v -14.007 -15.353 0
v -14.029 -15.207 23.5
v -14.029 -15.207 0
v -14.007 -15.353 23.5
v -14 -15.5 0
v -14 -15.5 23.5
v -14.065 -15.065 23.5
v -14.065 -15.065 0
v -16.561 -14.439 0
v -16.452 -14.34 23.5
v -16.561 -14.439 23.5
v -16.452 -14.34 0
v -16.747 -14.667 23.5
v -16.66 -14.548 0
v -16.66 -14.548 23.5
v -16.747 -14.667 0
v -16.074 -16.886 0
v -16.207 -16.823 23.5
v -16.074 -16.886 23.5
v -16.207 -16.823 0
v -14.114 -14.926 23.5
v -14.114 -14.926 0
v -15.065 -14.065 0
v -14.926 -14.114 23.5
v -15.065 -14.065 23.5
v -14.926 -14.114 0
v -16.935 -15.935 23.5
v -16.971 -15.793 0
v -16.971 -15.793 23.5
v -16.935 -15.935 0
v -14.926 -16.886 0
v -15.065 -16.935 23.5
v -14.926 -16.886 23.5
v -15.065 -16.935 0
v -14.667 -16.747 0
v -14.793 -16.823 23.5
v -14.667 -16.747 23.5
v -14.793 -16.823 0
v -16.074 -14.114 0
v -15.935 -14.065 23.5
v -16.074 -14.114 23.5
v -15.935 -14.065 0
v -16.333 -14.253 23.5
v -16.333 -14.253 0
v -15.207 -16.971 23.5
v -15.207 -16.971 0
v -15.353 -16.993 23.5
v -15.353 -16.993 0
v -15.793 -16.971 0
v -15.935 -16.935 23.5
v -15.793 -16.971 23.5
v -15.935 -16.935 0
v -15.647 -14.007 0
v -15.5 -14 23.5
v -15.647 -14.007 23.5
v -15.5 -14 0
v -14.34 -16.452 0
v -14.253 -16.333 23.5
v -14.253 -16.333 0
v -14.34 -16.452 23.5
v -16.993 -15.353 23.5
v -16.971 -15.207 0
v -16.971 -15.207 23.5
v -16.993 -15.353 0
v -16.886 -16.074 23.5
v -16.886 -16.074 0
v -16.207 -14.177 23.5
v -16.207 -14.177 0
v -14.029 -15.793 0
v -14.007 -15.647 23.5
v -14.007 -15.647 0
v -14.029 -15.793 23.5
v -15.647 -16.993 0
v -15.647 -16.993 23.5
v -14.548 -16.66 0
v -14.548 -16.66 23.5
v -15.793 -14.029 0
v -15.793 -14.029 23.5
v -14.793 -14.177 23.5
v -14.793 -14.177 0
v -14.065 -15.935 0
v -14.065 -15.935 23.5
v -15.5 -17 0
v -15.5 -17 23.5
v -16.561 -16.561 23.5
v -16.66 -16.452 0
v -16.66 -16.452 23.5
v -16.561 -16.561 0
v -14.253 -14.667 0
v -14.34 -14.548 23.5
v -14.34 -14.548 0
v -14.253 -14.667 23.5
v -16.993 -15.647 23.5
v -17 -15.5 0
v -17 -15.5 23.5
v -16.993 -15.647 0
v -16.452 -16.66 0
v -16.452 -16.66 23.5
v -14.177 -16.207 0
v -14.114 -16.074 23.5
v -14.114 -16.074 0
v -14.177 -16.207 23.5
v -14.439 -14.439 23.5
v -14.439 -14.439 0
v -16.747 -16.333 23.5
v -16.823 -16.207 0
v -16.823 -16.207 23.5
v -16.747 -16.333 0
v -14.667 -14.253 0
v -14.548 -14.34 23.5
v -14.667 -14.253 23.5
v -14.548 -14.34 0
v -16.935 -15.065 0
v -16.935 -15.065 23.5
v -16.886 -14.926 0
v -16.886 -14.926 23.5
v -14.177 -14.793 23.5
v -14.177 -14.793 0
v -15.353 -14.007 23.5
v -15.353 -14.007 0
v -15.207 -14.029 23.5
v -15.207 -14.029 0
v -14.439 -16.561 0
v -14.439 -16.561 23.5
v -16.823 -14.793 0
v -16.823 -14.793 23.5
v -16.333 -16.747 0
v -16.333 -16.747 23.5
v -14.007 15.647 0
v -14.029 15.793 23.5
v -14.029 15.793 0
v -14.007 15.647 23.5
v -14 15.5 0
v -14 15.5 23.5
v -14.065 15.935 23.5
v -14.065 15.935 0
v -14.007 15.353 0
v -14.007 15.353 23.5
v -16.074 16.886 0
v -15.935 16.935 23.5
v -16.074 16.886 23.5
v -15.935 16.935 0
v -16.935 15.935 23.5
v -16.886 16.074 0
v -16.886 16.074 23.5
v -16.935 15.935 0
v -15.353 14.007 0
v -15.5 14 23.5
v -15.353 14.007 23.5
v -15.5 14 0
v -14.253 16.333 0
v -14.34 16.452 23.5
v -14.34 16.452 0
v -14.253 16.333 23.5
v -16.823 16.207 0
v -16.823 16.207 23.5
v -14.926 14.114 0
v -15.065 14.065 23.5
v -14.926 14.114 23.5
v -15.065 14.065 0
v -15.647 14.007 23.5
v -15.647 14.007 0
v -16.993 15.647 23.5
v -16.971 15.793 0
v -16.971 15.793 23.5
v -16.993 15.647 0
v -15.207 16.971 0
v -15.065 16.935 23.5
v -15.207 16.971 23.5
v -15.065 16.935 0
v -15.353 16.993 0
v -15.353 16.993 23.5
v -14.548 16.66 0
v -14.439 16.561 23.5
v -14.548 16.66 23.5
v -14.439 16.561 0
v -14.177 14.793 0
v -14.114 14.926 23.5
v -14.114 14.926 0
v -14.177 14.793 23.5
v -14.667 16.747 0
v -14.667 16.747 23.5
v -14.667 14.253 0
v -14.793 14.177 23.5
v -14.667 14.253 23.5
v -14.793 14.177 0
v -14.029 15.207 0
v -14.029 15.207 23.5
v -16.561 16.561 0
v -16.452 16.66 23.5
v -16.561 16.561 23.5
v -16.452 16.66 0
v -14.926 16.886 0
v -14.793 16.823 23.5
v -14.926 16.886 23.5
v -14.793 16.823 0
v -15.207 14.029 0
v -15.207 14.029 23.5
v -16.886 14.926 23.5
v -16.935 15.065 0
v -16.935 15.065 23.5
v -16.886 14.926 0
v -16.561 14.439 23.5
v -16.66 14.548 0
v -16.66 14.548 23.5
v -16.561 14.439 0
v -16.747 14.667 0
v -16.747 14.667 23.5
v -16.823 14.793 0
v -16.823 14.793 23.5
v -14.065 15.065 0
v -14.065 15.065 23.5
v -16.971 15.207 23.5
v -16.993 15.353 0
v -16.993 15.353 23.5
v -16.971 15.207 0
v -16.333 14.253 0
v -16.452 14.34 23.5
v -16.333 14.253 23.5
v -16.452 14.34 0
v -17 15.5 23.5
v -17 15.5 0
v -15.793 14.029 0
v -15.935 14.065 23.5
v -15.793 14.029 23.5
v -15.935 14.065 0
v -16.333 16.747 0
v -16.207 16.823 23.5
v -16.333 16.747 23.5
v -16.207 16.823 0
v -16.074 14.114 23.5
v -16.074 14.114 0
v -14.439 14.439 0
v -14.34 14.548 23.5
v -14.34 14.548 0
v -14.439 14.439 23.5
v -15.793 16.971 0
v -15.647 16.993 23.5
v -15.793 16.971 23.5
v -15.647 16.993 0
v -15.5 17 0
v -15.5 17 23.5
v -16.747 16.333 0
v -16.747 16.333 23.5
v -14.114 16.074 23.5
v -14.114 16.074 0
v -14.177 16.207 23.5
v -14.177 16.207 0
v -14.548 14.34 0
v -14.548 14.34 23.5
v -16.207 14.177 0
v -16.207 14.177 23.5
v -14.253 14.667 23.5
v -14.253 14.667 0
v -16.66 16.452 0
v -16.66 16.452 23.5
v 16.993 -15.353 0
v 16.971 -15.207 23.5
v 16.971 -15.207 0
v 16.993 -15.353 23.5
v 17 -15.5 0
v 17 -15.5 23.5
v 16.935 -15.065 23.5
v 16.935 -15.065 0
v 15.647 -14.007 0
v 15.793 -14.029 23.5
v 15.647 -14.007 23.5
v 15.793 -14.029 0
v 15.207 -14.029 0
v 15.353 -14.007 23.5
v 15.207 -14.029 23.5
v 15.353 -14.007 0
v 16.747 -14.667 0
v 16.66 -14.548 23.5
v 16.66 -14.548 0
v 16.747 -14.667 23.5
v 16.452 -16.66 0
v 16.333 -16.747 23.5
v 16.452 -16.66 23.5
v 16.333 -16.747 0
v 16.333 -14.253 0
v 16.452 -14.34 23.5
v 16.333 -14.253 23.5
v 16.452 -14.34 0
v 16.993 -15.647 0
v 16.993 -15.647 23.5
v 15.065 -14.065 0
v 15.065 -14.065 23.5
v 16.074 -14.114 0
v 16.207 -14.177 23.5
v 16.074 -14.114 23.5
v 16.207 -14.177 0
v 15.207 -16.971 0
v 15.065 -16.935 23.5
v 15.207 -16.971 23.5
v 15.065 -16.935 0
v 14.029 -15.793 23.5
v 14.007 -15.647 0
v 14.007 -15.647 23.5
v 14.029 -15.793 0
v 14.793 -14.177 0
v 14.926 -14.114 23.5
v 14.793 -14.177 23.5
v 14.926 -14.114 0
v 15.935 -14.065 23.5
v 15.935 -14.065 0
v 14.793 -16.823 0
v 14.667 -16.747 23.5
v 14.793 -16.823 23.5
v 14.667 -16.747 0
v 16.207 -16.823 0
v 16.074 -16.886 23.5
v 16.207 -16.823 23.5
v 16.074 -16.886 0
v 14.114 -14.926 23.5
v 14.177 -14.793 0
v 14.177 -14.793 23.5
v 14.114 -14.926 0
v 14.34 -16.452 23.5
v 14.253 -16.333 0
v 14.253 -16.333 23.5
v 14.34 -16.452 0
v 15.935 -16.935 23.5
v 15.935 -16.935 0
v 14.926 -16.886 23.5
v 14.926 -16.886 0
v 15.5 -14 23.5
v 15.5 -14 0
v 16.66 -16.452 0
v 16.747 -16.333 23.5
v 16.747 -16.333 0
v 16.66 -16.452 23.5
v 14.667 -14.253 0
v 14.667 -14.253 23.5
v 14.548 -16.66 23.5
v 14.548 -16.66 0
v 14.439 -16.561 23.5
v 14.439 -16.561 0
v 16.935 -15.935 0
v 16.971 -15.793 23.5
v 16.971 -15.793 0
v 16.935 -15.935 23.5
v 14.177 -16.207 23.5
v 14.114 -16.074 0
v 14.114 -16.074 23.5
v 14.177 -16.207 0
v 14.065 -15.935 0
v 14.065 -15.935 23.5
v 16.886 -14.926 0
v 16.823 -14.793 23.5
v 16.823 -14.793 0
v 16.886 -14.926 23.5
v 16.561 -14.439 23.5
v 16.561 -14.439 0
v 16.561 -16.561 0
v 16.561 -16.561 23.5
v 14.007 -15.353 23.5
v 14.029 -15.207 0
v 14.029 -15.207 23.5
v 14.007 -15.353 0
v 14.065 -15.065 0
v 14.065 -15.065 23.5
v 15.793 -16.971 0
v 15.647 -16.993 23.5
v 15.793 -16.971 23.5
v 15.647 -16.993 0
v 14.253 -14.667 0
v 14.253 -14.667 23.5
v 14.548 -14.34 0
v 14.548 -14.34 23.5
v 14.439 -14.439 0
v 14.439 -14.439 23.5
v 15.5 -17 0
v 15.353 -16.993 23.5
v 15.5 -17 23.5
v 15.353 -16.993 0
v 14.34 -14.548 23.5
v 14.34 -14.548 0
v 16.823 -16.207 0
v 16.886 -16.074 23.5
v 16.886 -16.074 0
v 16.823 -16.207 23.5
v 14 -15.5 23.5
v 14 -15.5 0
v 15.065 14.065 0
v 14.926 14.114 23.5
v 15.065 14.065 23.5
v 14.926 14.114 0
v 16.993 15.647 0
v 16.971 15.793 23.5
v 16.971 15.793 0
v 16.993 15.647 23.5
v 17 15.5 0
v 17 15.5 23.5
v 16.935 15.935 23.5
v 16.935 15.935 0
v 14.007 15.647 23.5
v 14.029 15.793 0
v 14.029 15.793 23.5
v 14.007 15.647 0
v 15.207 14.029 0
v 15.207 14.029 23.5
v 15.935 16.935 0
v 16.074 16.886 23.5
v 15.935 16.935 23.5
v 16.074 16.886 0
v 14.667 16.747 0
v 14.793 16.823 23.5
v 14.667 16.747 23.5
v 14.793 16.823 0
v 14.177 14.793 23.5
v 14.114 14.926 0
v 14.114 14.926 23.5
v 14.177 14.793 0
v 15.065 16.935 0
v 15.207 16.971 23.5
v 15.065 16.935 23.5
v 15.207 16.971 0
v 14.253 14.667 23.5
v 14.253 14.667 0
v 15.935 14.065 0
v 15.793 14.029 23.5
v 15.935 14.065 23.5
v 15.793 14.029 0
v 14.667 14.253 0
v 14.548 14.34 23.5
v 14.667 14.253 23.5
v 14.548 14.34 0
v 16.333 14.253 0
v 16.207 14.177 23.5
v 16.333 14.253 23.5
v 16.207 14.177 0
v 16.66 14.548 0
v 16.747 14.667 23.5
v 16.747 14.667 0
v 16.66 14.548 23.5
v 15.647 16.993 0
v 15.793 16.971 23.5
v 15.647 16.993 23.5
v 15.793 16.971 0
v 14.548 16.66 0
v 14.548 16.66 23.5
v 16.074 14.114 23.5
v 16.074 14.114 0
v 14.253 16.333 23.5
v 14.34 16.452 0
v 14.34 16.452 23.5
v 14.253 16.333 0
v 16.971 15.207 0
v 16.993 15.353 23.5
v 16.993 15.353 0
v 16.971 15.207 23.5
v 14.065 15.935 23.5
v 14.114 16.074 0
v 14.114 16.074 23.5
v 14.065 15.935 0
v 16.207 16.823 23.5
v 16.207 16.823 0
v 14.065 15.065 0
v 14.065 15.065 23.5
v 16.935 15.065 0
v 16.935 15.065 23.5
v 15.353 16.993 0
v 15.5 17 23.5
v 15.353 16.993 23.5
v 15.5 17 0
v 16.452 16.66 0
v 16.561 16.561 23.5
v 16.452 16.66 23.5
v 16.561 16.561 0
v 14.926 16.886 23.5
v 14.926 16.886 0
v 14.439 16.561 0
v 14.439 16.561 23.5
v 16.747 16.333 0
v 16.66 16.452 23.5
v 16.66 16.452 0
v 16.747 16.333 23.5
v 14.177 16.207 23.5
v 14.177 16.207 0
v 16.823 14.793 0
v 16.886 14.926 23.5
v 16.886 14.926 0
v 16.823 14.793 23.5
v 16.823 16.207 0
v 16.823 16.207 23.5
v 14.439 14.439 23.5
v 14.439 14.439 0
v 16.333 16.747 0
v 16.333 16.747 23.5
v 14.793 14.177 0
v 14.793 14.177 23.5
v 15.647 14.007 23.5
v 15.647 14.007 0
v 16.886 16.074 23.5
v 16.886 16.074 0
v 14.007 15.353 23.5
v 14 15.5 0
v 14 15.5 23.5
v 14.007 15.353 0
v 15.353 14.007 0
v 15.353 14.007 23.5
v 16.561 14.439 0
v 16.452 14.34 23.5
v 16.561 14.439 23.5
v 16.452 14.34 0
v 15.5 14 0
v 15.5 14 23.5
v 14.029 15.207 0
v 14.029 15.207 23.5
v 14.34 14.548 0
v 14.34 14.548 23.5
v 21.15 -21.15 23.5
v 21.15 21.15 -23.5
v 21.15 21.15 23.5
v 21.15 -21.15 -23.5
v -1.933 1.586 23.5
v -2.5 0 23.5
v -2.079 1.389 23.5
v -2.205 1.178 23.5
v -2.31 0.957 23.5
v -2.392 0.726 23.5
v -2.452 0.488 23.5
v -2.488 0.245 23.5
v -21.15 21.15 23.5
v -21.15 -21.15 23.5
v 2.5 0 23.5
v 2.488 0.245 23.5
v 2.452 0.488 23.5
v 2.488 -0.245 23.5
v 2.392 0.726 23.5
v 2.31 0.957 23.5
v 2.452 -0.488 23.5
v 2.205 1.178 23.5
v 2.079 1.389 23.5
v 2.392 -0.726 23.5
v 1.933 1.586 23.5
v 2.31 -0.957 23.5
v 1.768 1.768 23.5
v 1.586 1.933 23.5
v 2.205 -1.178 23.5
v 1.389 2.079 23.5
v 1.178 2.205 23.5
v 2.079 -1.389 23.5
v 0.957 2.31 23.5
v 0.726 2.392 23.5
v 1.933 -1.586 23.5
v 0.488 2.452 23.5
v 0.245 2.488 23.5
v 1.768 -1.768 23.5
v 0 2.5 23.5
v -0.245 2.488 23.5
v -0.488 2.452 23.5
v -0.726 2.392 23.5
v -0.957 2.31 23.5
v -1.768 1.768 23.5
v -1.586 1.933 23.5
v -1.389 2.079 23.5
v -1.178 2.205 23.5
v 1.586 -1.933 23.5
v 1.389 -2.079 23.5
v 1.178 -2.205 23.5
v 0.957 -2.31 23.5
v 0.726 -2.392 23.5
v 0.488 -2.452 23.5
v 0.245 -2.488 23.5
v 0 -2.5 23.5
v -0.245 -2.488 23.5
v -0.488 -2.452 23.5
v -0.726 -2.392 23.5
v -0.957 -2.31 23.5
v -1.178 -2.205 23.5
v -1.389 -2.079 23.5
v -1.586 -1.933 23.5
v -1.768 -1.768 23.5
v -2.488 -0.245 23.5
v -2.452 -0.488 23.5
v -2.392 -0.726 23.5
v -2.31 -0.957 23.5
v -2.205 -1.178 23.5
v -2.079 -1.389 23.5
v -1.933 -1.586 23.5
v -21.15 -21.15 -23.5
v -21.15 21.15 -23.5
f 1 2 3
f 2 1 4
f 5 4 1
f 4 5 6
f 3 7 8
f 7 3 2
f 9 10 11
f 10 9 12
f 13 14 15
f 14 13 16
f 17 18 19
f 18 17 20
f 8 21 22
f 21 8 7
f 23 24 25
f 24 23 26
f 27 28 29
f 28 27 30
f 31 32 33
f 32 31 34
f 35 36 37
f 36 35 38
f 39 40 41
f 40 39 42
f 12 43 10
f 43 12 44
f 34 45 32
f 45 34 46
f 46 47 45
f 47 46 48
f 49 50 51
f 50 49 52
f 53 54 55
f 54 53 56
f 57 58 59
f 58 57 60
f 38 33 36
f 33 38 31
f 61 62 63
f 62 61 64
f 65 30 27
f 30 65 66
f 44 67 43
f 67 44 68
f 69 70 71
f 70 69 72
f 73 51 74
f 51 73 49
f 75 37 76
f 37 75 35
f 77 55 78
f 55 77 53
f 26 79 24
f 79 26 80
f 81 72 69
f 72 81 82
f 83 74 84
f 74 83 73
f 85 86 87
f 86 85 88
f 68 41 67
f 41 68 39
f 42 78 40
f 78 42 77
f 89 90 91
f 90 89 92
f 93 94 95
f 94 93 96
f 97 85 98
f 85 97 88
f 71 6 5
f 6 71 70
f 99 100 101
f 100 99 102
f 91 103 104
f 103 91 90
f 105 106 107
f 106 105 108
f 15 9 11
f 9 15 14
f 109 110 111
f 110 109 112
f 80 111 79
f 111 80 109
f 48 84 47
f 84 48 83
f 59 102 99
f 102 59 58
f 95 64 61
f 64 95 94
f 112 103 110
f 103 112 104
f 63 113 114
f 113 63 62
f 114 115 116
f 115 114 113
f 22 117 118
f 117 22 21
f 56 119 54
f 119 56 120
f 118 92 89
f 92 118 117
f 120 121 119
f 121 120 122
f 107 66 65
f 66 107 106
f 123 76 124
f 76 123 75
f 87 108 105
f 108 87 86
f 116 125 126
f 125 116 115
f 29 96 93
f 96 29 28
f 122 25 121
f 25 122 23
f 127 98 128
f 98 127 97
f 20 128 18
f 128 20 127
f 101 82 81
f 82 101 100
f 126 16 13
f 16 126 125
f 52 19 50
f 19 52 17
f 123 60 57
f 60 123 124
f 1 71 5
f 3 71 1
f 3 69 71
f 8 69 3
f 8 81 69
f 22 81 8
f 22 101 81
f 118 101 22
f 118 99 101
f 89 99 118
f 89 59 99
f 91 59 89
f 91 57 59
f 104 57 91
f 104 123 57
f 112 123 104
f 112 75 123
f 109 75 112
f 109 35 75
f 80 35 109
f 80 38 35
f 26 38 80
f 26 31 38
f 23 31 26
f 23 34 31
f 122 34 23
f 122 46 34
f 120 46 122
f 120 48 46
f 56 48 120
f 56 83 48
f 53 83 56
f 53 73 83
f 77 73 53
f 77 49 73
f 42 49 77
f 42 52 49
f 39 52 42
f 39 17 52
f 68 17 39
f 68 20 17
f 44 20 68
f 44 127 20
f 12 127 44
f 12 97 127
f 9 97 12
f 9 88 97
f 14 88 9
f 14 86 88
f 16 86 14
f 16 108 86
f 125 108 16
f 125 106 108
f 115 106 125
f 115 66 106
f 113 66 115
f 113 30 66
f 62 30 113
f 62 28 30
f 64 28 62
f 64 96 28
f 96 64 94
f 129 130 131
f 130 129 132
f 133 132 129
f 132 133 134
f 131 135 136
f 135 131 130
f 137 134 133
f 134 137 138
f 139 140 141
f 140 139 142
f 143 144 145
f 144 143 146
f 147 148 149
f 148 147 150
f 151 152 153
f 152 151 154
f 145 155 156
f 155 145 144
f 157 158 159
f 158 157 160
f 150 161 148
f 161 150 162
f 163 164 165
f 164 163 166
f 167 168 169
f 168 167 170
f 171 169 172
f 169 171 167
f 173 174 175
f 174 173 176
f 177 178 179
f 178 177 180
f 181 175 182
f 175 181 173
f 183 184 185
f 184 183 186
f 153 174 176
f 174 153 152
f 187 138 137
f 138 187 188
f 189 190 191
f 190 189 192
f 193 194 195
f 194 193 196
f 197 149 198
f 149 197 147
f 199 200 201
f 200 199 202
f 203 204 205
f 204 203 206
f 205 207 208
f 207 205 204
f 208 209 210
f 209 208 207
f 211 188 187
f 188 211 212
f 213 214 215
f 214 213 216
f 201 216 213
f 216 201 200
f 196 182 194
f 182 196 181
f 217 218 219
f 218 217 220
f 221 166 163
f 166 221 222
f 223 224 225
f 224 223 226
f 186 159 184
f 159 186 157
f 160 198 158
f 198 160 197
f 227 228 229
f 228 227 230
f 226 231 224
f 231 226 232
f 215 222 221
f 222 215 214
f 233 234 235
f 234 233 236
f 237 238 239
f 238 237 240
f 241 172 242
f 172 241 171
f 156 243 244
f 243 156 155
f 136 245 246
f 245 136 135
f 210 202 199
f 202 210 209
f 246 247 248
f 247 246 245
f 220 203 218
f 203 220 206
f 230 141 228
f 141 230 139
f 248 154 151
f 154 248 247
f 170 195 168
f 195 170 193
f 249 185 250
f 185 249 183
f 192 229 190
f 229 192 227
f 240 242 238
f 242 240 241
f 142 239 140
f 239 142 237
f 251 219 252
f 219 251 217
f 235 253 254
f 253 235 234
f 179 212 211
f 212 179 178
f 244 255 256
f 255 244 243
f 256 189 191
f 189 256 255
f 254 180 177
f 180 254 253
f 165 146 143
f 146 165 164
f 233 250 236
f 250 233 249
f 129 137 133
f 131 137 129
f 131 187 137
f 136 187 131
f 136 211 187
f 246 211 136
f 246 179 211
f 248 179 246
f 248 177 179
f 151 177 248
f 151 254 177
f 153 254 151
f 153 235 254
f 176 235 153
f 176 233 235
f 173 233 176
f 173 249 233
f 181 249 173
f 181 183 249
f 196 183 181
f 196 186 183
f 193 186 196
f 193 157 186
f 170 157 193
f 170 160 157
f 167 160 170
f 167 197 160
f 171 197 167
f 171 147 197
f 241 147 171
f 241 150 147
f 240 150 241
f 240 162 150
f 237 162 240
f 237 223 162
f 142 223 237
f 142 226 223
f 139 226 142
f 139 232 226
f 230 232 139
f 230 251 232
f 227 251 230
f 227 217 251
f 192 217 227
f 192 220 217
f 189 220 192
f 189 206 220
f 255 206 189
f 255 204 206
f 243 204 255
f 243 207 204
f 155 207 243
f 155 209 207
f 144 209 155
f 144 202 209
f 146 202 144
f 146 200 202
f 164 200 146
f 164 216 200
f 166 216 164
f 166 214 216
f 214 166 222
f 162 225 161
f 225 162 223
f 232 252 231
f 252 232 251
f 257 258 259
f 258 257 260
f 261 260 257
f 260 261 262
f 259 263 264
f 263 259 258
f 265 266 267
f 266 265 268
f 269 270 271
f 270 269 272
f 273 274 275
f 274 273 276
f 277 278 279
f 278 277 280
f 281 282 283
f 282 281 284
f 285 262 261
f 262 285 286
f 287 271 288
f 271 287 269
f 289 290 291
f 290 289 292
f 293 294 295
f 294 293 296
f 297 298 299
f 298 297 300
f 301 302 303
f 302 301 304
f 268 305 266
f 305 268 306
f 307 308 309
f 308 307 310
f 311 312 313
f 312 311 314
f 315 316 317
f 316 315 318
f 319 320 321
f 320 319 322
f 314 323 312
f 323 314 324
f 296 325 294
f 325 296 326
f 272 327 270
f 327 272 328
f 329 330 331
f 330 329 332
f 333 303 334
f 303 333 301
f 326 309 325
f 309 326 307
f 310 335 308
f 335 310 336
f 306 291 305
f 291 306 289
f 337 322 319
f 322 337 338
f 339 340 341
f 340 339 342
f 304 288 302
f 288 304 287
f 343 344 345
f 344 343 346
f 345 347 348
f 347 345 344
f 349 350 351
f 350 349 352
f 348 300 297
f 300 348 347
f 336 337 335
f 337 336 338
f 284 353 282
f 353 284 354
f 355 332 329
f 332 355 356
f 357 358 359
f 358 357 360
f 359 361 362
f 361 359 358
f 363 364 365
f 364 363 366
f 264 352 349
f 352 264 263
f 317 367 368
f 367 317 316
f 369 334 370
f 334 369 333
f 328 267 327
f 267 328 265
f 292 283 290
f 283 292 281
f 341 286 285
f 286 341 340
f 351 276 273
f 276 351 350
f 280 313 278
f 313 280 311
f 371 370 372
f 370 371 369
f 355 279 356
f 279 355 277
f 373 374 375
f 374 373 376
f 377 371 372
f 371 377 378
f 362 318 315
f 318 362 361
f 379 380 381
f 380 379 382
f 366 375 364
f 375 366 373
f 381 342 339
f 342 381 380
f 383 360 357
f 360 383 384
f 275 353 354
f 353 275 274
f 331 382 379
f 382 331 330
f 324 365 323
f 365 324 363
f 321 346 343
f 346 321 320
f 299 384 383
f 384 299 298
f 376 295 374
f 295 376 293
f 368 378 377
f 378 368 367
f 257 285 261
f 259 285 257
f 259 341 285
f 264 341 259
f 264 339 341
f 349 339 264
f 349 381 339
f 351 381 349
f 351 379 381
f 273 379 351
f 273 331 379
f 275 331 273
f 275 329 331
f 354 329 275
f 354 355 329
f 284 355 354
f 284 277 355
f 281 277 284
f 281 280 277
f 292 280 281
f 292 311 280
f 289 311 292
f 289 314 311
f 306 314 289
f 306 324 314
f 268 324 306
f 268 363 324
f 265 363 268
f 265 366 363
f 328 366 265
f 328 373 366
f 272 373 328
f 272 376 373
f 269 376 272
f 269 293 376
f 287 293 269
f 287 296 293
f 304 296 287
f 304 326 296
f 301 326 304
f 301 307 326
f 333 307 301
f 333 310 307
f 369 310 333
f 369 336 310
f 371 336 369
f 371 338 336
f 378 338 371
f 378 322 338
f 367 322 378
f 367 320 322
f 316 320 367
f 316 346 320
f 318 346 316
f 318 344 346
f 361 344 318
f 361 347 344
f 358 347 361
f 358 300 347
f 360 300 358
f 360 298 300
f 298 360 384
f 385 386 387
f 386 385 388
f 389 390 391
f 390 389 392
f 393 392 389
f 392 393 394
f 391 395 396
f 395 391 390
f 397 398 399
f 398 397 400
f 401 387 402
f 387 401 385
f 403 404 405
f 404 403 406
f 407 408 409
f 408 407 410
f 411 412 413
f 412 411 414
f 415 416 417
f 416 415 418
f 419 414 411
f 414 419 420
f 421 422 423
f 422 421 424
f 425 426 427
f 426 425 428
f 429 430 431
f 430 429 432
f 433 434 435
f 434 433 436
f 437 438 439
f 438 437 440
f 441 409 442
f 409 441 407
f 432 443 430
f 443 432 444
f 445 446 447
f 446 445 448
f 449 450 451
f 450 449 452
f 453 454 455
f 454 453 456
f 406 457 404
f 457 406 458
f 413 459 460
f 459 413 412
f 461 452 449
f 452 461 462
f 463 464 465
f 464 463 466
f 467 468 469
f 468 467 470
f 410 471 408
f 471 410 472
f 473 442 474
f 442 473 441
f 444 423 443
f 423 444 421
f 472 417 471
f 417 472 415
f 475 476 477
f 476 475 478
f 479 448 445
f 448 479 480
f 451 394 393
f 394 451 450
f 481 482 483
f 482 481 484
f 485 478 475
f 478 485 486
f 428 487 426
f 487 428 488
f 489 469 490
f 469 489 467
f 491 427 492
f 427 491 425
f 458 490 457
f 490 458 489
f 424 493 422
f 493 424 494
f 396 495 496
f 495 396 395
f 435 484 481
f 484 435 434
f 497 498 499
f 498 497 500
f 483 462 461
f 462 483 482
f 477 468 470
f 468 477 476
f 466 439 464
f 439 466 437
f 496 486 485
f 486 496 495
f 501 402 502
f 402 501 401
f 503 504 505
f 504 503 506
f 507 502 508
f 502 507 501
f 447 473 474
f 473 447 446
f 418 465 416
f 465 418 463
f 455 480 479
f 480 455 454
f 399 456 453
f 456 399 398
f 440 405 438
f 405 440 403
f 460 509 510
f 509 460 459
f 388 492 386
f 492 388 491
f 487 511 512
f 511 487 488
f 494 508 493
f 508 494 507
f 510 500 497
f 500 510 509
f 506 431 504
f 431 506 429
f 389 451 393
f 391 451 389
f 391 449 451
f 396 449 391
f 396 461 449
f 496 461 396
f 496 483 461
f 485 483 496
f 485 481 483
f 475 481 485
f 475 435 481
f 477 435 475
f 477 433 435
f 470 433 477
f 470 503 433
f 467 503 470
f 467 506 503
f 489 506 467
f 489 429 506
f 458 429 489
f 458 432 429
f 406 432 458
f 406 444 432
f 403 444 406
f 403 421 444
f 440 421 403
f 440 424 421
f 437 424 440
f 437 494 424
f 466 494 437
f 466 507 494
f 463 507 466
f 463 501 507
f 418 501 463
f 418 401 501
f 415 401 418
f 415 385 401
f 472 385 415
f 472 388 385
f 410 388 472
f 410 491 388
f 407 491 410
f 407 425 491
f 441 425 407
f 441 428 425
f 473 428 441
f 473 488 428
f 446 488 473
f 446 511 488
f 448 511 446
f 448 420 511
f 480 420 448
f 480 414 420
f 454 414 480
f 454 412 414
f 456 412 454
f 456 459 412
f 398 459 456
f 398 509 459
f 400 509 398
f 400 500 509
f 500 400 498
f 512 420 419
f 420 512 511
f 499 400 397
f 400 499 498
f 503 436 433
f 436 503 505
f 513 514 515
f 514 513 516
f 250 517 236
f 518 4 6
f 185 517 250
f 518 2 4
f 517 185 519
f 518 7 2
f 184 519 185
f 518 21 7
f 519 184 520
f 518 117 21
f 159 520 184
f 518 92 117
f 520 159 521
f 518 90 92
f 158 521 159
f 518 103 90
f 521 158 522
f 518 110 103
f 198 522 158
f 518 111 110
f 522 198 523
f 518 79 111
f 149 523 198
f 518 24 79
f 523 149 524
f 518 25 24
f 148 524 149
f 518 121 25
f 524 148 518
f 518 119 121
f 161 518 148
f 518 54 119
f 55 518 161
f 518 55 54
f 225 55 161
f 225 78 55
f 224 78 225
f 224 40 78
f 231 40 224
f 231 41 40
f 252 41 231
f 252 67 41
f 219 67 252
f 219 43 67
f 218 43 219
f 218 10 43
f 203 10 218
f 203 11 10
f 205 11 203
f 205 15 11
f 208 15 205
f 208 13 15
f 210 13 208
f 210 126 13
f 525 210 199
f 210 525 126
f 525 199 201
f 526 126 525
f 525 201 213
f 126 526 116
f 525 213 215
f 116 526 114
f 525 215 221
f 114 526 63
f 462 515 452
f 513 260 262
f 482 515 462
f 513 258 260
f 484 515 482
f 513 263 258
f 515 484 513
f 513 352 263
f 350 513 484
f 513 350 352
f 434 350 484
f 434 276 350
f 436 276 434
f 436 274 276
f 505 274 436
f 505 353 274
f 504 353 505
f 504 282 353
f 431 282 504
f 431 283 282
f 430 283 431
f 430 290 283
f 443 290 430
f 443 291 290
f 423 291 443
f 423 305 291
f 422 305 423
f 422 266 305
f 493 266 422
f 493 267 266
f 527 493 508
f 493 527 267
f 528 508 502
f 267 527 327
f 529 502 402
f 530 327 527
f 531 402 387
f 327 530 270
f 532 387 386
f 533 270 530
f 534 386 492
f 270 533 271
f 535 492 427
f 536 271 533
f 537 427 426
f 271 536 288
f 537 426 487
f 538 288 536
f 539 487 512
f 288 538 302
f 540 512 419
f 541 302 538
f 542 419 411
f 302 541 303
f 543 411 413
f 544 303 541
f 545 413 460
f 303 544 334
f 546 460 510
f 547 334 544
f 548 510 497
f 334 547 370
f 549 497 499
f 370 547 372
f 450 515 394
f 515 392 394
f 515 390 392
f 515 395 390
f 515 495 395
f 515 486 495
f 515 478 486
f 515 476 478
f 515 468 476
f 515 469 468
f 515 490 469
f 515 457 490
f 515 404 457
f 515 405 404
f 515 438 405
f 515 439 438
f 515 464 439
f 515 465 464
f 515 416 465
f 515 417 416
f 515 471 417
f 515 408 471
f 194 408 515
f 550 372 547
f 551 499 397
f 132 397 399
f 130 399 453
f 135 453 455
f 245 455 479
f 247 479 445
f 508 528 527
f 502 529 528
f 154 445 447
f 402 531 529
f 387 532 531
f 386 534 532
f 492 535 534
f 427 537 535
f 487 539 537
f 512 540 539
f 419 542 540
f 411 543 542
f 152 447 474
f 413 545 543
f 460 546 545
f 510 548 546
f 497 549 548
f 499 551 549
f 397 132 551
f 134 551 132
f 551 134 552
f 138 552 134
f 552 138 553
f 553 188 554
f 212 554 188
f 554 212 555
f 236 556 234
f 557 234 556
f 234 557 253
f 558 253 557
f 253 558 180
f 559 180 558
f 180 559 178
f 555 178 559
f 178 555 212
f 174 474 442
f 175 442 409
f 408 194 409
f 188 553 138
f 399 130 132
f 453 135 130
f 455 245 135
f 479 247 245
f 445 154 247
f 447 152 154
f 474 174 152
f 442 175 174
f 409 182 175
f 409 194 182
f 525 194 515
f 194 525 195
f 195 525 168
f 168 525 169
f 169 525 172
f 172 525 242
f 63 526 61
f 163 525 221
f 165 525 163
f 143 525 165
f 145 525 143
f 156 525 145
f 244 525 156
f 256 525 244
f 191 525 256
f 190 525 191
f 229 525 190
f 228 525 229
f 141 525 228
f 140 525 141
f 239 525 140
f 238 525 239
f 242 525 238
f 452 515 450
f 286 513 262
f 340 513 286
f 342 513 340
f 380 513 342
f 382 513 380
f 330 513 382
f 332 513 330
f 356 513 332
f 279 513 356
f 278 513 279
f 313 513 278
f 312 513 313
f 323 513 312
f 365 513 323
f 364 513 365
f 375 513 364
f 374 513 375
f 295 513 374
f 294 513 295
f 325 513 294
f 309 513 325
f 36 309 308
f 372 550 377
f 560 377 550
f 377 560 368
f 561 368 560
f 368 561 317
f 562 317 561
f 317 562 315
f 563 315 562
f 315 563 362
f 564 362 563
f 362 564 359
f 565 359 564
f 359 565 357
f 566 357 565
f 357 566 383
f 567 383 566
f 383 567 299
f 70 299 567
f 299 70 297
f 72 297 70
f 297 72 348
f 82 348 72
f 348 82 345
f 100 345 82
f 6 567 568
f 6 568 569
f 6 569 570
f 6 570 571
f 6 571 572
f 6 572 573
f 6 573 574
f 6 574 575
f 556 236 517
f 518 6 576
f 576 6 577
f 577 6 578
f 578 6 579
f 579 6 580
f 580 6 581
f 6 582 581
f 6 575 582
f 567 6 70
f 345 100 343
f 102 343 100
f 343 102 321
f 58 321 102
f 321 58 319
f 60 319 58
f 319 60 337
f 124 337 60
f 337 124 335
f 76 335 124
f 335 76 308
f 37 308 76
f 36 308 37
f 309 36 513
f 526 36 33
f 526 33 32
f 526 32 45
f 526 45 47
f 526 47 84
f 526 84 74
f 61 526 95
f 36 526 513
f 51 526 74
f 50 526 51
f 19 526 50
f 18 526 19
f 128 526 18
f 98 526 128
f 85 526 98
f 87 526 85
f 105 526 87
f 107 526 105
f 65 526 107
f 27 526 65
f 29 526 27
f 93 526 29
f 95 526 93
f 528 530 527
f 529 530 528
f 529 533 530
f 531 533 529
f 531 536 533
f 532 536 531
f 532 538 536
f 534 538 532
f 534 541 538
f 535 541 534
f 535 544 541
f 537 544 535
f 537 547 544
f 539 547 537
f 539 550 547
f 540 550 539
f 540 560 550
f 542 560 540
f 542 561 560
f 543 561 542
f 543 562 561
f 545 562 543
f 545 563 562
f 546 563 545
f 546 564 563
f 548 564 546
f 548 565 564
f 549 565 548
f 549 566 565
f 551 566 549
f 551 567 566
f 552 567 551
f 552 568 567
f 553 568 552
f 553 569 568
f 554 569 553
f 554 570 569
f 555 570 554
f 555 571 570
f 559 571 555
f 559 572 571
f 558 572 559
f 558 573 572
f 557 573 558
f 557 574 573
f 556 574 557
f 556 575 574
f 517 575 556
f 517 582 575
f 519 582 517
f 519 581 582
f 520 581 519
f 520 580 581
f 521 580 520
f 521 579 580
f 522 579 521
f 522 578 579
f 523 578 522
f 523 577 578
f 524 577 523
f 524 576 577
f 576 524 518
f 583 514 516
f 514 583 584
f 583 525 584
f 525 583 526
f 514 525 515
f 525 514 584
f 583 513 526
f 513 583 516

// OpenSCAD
module stepper_motor() {
    difference() {
        // Main body of the stepper motor
        translate([-21.15, -21.15, -23.5])
            cube([42.3, 42.3, 47.0]);

        // Shaft hole
        translate([0, 0, 23.5])
            cylinder(h=47.0, d=5.0, $fn=64);

        // Mounting holes
        for (x = [-15.5, 15.5])
            for (y = [-15.5, 15.5])
                translate([x, y, 0])
                    cylinder(h=47.0, d=3.0, $fn=64);
    }
}

stepper_motor();
